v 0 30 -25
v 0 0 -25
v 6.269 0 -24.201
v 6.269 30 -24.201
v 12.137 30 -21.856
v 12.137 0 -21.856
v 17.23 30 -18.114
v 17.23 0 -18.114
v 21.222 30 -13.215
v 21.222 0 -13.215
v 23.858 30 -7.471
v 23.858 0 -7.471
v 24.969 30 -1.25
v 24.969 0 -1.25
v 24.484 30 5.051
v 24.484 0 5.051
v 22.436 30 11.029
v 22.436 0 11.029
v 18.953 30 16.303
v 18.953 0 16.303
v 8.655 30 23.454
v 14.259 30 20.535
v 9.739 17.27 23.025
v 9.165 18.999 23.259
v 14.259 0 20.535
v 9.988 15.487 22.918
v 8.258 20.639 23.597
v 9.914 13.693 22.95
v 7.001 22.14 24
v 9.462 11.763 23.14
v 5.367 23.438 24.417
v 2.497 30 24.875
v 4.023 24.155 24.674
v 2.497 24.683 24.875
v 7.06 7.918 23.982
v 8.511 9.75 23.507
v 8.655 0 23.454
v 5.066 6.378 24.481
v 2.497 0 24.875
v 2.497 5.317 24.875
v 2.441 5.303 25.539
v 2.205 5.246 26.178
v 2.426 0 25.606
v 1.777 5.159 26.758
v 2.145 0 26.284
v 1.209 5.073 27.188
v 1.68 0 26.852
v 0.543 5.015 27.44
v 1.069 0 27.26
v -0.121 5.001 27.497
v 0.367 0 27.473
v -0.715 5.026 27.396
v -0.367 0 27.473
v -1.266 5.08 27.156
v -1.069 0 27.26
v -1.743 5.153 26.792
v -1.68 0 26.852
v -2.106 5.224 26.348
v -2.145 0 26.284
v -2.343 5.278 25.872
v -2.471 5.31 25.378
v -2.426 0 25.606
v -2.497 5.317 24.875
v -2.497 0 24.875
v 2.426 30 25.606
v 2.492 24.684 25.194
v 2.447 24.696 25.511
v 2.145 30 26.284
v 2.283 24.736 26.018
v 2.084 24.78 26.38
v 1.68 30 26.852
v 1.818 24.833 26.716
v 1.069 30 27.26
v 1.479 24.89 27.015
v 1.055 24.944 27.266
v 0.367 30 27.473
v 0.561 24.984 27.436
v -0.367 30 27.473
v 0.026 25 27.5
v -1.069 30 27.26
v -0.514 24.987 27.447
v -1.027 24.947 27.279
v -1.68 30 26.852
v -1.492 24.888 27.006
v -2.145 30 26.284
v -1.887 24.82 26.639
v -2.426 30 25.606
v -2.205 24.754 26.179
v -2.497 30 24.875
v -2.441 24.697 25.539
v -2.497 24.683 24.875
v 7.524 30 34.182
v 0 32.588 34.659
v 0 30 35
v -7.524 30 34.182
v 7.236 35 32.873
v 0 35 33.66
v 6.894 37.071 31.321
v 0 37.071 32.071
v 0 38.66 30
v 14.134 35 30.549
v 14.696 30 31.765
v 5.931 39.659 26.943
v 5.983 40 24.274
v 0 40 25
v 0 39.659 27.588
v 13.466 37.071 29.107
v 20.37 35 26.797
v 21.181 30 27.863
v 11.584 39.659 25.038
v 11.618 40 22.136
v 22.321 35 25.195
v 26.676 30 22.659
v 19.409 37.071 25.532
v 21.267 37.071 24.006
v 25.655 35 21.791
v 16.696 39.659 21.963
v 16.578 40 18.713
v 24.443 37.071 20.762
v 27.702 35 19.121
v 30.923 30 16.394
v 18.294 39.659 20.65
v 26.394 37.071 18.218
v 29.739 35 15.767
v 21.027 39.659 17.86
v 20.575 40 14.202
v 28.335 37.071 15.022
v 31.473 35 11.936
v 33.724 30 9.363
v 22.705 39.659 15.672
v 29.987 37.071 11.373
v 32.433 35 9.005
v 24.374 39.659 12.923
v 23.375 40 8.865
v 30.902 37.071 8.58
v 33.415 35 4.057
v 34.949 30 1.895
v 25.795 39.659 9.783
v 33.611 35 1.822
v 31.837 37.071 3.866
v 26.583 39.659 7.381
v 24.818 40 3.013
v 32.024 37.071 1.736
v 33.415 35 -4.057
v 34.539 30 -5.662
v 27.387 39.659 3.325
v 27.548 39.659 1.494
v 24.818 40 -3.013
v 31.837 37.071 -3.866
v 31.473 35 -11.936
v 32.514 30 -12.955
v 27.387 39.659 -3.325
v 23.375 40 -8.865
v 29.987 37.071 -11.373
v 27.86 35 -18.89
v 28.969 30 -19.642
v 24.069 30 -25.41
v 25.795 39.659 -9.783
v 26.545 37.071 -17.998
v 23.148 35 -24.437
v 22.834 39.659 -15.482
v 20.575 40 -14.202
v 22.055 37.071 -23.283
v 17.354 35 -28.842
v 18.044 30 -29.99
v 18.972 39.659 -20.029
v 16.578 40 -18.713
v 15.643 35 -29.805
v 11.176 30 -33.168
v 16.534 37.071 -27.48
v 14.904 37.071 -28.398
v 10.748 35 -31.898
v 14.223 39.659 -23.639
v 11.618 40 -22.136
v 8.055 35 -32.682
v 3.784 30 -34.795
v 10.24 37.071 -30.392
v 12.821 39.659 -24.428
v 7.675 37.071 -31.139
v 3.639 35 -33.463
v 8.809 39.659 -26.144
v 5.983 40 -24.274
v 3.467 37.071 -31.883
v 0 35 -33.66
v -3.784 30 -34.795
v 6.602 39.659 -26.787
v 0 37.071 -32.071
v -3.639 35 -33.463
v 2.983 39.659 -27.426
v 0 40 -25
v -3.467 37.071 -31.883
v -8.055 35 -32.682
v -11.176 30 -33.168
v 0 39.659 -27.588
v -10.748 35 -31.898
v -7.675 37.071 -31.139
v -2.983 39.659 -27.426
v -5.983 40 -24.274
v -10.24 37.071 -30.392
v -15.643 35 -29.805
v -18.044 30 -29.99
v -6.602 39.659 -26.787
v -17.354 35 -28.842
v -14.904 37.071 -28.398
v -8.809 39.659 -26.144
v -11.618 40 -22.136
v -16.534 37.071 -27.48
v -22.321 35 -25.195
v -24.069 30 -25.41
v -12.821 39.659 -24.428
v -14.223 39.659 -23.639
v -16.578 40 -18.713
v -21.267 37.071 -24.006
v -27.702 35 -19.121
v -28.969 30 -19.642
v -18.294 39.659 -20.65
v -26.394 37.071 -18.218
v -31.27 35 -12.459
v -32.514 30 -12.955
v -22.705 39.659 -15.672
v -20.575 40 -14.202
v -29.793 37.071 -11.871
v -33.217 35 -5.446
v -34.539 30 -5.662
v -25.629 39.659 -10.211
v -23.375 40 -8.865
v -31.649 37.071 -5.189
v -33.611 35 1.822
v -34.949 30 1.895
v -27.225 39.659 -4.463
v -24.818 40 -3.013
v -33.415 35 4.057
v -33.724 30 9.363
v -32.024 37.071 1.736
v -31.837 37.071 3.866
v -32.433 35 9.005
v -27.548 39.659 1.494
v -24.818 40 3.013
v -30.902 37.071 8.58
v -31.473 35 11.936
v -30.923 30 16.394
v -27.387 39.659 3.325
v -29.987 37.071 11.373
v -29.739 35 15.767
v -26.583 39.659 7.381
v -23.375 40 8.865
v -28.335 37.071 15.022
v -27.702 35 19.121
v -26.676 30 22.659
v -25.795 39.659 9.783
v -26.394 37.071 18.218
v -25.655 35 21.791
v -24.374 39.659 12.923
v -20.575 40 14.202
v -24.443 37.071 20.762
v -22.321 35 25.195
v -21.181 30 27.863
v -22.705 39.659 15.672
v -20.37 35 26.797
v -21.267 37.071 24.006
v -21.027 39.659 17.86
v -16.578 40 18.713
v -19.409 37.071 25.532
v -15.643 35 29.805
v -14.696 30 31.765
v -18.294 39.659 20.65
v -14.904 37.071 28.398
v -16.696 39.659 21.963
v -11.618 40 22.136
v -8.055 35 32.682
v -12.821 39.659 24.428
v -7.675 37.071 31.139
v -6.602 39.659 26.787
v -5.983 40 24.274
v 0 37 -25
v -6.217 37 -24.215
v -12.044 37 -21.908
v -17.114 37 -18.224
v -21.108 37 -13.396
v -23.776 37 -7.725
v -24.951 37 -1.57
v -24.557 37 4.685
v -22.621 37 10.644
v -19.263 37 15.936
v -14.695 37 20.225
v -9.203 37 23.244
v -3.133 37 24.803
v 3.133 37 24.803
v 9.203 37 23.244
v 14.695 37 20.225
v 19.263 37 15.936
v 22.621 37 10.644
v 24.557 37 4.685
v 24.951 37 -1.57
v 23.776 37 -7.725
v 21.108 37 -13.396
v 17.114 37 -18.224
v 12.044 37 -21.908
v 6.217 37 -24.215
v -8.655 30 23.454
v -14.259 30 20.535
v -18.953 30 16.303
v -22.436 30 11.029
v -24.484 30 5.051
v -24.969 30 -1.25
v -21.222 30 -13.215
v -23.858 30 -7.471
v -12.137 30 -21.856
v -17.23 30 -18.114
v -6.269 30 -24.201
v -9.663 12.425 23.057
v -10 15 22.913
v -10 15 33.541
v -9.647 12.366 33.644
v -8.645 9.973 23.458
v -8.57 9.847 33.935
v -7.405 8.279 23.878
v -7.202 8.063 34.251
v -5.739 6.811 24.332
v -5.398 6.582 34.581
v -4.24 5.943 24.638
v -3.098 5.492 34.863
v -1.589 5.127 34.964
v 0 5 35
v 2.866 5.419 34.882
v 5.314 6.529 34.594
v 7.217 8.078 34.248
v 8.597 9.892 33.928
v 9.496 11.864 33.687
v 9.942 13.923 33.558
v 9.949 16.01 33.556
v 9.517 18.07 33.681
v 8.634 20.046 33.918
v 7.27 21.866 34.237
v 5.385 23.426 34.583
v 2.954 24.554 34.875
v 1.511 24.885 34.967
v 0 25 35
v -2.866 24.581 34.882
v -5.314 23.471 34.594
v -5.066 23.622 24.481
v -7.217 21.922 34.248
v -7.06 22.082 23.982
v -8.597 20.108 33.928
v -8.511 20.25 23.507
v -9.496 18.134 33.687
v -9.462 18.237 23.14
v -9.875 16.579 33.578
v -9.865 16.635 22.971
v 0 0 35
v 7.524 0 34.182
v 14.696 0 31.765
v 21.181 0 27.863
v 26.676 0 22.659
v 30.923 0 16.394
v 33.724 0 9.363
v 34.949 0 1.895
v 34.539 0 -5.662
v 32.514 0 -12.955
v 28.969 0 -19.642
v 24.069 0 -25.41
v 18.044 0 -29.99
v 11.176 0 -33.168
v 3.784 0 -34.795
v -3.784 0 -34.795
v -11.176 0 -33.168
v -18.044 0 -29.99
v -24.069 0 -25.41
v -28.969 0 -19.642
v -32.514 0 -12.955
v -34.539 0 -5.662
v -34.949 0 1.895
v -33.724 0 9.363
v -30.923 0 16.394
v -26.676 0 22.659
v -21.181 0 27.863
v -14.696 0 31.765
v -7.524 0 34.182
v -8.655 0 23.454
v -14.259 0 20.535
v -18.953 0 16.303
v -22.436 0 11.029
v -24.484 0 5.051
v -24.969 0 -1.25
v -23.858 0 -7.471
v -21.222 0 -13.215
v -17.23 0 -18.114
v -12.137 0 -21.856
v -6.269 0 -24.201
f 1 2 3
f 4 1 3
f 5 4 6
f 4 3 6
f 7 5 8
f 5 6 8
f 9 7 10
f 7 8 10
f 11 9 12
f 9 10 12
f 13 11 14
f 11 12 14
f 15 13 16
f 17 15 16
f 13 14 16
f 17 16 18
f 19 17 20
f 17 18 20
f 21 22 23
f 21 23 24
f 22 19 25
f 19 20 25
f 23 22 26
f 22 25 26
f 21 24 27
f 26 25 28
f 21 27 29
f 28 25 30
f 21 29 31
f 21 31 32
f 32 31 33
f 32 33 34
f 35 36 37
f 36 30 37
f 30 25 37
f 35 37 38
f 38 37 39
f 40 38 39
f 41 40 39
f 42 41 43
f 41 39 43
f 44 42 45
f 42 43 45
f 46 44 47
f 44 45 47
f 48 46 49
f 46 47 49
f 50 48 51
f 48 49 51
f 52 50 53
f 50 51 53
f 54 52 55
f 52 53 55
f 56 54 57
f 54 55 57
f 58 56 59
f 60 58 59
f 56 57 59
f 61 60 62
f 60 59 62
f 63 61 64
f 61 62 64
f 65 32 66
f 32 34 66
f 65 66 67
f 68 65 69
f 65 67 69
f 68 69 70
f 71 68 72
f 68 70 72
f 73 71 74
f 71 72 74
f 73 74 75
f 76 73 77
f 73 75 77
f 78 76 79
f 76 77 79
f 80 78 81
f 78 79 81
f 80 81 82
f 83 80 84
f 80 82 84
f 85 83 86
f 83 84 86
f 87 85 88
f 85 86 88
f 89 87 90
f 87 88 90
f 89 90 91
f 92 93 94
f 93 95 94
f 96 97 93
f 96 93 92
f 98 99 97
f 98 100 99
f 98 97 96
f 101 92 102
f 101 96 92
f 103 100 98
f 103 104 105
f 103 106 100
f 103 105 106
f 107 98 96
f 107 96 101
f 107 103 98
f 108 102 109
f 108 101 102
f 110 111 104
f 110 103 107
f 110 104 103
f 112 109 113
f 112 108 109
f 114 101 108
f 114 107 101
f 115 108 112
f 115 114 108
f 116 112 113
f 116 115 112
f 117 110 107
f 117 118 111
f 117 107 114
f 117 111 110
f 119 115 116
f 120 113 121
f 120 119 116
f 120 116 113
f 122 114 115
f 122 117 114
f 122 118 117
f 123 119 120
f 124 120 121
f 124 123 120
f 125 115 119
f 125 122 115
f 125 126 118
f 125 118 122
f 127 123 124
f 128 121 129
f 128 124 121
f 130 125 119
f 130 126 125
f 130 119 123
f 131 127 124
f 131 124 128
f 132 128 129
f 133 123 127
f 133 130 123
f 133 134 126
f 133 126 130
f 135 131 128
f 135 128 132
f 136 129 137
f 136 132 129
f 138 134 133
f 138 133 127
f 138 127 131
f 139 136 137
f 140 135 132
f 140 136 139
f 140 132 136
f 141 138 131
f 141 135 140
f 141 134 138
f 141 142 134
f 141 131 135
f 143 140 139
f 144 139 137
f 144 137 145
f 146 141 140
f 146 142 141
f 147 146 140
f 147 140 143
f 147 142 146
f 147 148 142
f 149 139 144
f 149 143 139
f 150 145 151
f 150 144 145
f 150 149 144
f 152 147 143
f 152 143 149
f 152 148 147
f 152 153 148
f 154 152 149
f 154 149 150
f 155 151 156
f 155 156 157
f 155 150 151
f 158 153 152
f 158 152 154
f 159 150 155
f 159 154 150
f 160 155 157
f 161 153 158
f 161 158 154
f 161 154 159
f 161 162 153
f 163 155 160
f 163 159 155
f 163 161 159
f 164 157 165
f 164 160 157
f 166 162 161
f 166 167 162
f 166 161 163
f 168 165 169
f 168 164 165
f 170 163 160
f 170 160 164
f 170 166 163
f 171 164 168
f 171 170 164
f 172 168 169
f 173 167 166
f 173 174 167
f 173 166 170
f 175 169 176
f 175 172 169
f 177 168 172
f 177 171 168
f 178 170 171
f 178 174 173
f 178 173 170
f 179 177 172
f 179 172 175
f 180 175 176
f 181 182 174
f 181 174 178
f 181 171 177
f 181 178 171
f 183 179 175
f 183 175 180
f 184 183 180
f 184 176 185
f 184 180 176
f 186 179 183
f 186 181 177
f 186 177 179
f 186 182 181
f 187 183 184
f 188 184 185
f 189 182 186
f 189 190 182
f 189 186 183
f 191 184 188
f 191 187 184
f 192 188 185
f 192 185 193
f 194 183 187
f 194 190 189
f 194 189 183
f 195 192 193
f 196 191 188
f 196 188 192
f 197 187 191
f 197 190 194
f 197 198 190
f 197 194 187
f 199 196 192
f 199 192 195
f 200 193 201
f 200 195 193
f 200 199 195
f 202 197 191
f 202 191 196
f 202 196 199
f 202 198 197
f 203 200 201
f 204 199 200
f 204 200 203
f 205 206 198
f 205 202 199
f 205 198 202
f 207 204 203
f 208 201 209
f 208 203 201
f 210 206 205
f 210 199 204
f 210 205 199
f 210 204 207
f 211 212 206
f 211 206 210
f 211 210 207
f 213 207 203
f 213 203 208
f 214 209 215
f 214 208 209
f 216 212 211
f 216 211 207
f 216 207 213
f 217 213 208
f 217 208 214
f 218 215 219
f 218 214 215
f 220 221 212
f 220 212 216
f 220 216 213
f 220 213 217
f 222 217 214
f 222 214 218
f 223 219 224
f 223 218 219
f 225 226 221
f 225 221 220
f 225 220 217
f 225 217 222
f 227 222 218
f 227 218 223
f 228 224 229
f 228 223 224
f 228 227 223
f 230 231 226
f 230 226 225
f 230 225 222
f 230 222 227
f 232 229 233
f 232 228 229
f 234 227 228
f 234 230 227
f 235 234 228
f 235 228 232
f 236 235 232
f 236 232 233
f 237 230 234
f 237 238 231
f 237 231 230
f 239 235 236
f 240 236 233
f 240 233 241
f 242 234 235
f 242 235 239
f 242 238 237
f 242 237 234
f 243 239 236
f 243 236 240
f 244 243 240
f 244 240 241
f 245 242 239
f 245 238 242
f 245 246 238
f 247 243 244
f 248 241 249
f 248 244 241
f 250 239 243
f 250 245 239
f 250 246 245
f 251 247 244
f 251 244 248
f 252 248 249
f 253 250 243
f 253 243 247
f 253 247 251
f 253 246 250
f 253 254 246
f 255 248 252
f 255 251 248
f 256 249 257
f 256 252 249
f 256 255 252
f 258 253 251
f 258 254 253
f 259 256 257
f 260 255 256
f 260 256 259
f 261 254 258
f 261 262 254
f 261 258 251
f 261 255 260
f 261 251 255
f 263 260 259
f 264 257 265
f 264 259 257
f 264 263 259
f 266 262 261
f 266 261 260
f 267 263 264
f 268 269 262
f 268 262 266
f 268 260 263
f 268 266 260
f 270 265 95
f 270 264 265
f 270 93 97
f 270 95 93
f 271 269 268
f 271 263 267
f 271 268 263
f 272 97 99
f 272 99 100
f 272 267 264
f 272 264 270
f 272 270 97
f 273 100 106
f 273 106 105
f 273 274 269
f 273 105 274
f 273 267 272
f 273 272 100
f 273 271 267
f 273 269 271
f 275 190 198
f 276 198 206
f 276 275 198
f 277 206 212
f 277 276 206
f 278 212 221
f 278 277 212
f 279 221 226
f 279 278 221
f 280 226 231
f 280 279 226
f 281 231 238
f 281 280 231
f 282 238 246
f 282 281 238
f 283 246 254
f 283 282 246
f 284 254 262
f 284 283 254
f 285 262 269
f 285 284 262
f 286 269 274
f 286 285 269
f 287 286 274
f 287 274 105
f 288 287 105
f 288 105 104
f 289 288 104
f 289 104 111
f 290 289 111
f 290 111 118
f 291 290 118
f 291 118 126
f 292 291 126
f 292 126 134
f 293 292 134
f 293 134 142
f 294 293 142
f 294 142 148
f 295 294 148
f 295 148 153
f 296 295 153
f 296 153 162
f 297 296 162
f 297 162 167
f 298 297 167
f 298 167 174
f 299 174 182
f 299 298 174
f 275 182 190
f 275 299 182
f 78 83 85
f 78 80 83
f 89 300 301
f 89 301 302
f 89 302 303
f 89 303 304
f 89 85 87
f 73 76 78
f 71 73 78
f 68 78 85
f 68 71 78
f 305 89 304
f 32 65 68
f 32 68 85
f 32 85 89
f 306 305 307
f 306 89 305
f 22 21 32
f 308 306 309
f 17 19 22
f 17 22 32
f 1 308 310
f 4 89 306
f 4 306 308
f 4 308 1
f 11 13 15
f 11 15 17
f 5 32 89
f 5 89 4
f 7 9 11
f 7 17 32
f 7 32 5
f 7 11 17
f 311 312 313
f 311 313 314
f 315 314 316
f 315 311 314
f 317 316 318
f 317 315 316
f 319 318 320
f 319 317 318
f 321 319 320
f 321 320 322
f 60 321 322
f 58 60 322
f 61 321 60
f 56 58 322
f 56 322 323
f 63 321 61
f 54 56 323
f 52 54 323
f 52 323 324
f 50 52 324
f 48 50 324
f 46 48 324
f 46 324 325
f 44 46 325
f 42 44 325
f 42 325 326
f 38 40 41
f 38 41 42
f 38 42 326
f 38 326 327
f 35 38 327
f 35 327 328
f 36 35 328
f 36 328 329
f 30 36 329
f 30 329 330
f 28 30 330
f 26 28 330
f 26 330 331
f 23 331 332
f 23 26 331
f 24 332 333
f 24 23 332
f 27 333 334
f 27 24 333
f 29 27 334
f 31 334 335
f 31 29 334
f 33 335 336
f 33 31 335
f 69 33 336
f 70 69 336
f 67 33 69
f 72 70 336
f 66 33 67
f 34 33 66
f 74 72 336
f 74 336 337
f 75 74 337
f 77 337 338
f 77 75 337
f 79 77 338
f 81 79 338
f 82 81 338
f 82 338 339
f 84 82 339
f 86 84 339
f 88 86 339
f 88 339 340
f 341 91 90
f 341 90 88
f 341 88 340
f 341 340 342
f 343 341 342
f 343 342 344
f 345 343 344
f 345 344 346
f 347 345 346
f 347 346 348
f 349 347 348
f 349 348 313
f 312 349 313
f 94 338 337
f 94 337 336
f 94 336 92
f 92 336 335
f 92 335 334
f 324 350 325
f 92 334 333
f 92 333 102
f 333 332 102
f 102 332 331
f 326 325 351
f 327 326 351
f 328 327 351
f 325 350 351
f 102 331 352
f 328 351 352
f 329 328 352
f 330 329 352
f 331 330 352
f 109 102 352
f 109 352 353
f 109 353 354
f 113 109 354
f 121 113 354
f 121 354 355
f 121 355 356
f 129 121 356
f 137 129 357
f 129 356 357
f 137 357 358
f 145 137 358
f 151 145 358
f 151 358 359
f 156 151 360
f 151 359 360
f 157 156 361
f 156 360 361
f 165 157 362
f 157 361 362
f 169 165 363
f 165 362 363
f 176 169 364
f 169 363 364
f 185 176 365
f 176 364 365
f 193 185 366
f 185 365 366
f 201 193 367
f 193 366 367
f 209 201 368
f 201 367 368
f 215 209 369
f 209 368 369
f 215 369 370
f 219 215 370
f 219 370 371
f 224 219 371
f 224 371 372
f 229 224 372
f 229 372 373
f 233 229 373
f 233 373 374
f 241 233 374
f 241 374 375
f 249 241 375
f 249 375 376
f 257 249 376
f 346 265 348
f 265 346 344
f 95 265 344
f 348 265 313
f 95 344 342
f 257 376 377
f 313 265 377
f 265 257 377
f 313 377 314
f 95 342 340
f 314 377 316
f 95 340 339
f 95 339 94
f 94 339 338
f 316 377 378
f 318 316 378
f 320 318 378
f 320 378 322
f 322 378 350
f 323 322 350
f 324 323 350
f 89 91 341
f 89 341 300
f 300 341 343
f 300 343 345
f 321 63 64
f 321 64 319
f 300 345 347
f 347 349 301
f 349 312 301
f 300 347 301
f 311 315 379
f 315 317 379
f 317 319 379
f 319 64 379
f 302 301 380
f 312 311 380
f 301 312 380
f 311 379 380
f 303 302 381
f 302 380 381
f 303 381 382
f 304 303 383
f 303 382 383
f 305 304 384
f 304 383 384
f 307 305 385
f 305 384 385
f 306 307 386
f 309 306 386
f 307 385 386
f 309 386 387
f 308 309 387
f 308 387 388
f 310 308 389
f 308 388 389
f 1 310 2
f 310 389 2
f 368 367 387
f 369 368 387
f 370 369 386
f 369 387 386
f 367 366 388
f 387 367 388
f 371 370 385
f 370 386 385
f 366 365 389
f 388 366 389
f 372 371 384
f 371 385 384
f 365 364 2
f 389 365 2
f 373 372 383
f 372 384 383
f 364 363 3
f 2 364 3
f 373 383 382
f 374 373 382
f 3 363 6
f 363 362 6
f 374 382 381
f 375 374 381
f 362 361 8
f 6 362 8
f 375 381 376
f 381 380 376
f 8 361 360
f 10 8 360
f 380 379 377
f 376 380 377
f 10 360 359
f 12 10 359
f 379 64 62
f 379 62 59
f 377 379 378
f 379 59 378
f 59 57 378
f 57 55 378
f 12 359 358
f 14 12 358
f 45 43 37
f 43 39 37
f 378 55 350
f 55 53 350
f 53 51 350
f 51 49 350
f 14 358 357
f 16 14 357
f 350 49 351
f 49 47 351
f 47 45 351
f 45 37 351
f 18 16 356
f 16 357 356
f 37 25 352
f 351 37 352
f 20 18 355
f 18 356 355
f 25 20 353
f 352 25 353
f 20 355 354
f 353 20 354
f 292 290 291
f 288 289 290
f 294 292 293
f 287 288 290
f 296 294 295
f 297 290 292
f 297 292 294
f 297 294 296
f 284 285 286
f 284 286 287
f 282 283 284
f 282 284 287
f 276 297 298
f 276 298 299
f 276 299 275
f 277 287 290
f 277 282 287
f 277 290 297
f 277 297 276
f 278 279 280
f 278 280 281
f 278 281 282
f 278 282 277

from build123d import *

# Parameters (mm, degrees)
ESQUISSE2_R             = 35
BOSS_EXTRU_1_DEPTH      = 40
CONG_1_R                = 10
ESQUISSE3_R             = 25
ENL_V_MAT_EXTRU_1_DEPTH = 30
ENL_V_START             = -3
ESQUISSE7_R             = 25
ENL_V_MAT_EXTRU_3_DEPTH = 3
ESQUISSE8_R             = 10
ENL_V_MAT_EXTRU_4_DEPTH = 45
ESQUISSE4_R             = 2.5
ENL_V_MAT_EXTRU_5_DEPTH = 30


with BuildPart() as part:
    # Esquisse2 → Boss.-Extru.1 (new body)
    with BuildSketch(Plane(origin=(0, 0, 0), x_dir=(1, 0, 0), z_dir=(0, 1, 0))):
        with Locations(Location((0, 0, 0), (0, 0, 270))):
            Circle(ESQUISSE2_R)
    extrude(amount=BOSS_EXTRU_1_DEPTH)

    # Congé1
    cong_1_edges = [part.edges().sort_by_distance(p)[0] for p in [
        (0, 40, -35),
    ]]
    fillet(cong_1_edges, radius=CONG_1_R)

    # Esquisse3 → Enlèv. mat.-Extru.1 (cut)
    with BuildSketch(Plane.XZ):
        with Locations(Location((0, 0, 0), (0, 0, 270))):
            Circle(ESQUISSE3_R)
    extrude(amount=-ENL_V_MAT_EXTRU_1_DEPTH, mode=Mode.SUBTRACT)

    # Esquisse7 → Enlèv. mat.-Extru.3 (cut)
    with BuildSketch(Plane(origin=(0, 40, 0), x_dir=(1, 0, 0), z_dir=(0, 1, 0)).offset(ENL_V_START)):
        with Locations(Location((0, 0, 0), (0, 0, 90))):
            Circle(ESQUISSE7_R)
    extrude(amount=ENL_V_MAT_EXTRU_3_DEPTH, mode=Mode.SUBTRACT)

    # Esquisse8 → Enlèv. mat.-Extru.4 (cut)
    with BuildSketch(Plane.XY):
        with Locations(Location((0, 15, 0), (0, 0, 180))):
            Circle(ESQUISSE8_R)
    extrude(amount=ENL_V_MAT_EXTRU_4_DEPTH, mode=Mode.SUBTRACT)

    # Esquisse4 → Enlèv. mat.-Extru.5 (cut)
    with BuildSketch(Plane.XZ):
        with Locations((0, 25)):
            Circle(ESQUISSE4_R)
    extrude(amount=-ENL_V_MAT_EXTRU_5_DEPTH, mode=Mode.SUBTRACT)


solid = part.part
